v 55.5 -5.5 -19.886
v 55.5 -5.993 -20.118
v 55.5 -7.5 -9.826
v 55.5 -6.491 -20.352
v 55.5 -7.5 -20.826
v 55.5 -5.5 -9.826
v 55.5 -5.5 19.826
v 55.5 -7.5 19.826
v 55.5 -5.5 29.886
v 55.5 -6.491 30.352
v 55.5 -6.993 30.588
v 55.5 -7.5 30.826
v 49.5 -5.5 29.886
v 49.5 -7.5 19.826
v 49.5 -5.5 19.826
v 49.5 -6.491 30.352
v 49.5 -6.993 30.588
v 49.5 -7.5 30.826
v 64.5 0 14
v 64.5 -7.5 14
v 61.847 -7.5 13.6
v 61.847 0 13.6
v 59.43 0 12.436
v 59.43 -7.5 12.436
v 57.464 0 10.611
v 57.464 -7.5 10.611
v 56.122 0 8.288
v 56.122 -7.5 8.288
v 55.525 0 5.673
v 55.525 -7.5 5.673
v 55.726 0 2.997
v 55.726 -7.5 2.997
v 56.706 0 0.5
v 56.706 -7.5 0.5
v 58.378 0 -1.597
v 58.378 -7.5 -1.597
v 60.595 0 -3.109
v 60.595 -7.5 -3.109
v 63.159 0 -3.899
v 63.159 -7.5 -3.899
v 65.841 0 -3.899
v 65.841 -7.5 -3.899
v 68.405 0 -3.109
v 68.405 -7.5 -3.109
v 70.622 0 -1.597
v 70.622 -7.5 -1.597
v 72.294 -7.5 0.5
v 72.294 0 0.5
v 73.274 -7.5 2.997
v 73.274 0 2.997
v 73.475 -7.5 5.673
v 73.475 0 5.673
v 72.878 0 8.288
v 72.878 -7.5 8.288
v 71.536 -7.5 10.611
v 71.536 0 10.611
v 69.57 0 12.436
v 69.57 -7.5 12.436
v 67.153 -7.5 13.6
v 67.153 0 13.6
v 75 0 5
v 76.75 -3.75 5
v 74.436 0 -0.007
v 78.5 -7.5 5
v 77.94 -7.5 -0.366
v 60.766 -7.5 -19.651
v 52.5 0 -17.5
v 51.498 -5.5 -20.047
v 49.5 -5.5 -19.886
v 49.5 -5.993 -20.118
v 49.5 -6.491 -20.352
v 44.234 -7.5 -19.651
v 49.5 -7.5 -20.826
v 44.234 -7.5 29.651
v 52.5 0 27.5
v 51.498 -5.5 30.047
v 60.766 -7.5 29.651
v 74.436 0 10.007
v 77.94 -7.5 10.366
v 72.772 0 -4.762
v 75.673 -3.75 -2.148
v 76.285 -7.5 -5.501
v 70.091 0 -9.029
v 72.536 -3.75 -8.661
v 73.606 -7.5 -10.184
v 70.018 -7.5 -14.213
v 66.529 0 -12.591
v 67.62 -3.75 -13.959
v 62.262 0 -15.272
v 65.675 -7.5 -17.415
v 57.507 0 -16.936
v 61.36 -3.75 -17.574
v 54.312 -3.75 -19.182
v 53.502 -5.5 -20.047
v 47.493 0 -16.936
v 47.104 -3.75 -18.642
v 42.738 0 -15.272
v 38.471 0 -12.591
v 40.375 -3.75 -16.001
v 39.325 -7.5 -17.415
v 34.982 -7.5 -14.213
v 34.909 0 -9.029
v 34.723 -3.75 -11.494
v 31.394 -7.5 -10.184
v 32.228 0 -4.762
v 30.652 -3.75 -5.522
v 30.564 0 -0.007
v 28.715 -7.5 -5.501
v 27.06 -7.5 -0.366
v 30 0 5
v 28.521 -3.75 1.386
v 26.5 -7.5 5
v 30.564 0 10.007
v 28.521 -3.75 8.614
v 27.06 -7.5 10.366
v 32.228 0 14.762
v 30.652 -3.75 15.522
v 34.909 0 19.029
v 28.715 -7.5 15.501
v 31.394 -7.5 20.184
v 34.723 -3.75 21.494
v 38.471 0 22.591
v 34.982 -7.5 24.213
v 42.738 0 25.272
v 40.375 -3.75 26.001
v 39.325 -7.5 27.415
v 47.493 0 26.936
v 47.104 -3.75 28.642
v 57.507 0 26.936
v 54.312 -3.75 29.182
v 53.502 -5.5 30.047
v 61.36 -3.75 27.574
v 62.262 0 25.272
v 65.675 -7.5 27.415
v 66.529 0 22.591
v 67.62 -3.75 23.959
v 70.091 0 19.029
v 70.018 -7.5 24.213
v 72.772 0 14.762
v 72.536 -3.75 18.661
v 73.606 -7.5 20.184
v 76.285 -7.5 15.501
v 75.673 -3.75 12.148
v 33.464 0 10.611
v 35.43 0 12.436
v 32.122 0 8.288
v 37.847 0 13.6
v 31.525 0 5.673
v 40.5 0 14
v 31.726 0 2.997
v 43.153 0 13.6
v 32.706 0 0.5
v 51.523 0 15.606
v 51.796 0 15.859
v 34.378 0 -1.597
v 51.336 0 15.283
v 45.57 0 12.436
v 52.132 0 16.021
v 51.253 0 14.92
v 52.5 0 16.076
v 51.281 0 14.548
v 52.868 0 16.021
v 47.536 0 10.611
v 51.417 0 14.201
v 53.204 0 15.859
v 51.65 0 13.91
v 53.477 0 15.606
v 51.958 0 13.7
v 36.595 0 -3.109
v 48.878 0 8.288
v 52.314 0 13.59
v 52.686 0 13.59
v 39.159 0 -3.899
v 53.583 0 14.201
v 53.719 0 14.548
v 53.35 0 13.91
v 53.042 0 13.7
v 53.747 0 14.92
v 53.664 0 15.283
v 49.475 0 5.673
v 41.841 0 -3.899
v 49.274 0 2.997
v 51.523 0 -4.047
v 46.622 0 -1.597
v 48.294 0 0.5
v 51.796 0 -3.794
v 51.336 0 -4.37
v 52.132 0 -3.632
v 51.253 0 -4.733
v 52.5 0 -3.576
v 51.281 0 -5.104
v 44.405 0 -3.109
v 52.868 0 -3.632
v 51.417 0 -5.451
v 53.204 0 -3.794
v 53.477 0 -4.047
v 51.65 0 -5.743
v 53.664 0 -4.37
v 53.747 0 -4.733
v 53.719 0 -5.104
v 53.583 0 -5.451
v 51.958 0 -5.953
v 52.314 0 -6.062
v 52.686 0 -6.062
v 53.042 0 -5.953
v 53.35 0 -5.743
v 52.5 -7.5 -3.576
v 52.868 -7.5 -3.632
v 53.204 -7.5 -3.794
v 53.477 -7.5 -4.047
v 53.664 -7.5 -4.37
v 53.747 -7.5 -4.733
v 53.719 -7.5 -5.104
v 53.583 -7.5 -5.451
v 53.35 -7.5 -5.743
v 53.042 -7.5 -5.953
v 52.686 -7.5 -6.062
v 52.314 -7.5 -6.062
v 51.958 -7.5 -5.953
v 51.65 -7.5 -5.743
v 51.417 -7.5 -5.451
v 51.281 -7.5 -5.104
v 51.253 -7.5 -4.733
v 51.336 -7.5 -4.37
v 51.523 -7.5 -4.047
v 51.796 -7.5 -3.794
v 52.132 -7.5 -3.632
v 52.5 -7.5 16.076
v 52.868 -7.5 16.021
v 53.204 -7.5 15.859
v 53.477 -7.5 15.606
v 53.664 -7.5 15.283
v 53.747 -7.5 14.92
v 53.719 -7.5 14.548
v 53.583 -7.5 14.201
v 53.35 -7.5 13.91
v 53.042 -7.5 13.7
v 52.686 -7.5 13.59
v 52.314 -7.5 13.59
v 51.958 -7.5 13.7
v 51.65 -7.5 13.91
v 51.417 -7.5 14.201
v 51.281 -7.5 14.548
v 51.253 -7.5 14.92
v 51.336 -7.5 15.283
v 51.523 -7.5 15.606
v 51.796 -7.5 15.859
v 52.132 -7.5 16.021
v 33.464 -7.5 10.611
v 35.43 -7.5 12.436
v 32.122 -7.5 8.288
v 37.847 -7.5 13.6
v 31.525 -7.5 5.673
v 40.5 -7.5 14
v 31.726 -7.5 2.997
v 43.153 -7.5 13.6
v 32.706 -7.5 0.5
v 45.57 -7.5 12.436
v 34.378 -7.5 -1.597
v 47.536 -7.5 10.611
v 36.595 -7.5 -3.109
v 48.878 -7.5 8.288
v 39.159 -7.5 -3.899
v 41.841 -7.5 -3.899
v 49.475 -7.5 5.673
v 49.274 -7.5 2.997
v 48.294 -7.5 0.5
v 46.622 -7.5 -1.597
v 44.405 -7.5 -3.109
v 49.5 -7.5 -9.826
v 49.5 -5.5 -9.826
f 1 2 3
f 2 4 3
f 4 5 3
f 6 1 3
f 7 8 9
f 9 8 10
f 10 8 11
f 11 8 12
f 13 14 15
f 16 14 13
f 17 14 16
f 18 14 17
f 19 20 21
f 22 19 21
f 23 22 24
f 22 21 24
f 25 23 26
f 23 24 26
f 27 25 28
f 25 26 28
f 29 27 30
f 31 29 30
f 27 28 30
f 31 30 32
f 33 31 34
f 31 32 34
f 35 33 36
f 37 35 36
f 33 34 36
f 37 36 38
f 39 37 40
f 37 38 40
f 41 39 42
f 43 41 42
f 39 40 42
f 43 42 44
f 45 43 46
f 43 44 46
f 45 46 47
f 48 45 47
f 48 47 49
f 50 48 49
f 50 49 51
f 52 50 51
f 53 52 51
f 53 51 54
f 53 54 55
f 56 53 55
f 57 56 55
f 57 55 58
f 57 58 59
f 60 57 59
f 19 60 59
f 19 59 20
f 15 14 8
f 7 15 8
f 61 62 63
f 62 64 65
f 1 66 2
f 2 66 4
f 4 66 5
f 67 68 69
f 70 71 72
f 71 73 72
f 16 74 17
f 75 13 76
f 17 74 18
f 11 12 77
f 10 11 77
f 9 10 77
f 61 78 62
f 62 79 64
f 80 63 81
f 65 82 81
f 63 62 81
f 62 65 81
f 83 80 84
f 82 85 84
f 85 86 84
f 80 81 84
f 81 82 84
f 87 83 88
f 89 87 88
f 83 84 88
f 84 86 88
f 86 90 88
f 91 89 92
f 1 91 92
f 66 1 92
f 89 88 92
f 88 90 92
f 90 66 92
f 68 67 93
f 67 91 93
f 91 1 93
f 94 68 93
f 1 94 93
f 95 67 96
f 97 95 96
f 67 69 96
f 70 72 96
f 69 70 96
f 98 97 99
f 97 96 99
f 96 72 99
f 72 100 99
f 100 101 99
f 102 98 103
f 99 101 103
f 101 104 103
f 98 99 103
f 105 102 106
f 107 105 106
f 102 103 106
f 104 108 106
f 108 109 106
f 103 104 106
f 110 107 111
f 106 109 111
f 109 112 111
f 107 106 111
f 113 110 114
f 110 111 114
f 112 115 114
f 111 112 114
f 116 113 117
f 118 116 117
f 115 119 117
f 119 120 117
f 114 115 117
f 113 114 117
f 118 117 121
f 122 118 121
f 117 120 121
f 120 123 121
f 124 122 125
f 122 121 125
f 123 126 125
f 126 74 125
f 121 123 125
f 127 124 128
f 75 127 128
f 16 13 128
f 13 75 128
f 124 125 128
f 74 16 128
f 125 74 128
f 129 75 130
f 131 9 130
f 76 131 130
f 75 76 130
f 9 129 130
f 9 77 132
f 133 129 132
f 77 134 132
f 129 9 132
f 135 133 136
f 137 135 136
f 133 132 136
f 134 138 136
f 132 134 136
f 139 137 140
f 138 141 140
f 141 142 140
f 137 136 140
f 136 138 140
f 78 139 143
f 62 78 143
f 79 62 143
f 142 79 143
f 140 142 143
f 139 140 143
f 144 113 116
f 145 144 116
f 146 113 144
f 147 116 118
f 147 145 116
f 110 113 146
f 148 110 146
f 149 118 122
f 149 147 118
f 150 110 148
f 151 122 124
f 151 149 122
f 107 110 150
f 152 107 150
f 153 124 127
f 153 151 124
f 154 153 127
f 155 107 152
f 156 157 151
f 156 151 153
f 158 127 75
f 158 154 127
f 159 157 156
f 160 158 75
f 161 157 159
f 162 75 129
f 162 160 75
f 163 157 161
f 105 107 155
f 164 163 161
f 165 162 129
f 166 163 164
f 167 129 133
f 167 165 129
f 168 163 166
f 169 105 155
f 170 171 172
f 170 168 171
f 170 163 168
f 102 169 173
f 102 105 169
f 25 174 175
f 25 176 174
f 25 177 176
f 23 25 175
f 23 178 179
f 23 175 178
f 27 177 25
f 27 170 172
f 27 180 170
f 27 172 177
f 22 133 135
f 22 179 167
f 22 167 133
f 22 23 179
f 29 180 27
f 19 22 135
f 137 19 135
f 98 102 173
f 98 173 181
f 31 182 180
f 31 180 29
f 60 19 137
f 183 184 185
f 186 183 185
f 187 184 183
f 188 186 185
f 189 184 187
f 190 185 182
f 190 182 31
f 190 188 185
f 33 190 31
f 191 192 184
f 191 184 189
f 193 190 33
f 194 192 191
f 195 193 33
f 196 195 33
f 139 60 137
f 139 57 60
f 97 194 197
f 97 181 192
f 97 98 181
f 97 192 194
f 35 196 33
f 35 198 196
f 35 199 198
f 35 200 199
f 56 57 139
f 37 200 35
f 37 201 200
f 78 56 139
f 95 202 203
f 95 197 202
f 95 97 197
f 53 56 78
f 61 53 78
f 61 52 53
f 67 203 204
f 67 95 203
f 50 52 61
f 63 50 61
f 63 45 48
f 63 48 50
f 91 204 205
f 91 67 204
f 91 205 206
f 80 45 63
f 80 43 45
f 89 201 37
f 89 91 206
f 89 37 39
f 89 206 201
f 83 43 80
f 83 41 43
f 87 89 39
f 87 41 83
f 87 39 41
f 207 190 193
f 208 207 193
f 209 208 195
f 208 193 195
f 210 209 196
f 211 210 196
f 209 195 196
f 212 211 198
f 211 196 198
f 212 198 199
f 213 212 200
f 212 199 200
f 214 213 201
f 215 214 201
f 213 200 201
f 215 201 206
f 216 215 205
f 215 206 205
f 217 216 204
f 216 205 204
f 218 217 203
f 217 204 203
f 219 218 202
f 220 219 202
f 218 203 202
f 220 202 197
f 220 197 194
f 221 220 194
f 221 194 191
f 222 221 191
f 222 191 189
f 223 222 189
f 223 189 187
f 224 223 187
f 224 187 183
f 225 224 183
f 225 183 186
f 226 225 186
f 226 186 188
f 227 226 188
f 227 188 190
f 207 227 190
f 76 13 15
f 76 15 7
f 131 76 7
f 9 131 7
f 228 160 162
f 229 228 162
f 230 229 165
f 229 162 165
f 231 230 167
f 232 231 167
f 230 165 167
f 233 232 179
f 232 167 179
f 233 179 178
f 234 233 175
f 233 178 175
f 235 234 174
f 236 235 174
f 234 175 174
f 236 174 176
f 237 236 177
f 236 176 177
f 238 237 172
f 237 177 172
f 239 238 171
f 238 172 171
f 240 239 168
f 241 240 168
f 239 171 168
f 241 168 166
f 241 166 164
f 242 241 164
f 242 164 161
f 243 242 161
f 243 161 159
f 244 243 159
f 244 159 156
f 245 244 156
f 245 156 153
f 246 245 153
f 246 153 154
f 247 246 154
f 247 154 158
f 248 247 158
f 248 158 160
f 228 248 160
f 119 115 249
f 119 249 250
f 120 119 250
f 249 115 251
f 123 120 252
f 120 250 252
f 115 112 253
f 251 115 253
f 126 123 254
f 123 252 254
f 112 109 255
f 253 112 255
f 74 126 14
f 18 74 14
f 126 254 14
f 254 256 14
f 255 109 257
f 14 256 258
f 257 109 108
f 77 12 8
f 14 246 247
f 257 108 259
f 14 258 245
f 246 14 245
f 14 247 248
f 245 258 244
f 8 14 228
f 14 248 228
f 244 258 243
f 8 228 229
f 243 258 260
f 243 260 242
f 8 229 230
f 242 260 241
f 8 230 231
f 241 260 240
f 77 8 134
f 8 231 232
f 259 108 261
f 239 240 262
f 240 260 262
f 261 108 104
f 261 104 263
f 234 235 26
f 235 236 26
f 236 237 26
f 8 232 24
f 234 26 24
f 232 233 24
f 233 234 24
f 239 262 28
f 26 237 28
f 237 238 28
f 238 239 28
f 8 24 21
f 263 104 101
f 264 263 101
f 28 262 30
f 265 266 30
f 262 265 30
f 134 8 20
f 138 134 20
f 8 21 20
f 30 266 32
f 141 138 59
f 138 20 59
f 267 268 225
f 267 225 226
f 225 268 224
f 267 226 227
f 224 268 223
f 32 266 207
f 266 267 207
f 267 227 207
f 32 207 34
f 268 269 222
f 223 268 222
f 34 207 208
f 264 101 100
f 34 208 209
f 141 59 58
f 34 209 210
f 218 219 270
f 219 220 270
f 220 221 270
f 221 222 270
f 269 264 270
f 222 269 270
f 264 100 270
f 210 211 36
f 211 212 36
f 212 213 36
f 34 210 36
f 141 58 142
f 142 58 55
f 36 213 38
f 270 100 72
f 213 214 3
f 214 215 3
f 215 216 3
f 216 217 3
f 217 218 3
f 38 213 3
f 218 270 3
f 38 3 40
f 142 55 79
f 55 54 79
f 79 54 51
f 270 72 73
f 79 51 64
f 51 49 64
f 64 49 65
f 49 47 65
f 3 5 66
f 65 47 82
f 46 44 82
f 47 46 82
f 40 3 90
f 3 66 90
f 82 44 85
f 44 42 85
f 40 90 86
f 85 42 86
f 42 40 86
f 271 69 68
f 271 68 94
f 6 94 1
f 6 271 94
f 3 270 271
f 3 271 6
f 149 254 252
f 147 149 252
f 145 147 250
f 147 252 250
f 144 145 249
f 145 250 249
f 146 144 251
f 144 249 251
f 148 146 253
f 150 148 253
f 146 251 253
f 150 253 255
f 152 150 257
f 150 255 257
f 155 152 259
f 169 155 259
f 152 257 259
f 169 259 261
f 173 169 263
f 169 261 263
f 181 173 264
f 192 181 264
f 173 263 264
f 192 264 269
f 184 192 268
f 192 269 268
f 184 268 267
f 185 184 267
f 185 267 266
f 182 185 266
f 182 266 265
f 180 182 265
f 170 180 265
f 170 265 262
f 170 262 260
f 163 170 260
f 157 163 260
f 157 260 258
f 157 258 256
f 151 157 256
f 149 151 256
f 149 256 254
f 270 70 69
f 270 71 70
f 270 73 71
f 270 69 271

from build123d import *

# Parameters (mm, degrees)
SKETCH1_W                = 207
SKETCH1_H                = 106
BOSS_EXTRUDE1_DEPTH      = 35.5
SKETCH2_W                = 201
SKETCH2_H                = 100
CUT_EXTRUDE1_DEPTH       = 32
SKETCH3_W                = 204
SKETCH3_H                = 103
SKETCH3_W_2              = 201
SKETCH3_H_2              = 100
CUT_EXTRUDE2_DEPTH       = 3
M18_CLEARANCE_HOLE2_D    = 18
FILLET1_R                = 2
FILLET2_R                = 2
SKETCH6_W                = 10
SKETCH6_H                = 10
BOSS_EXTRUDE2_DEPTH      = 29
SKETCH7_W                = 10
SKETCH7_H                = 10
BOSS_EXTRUDE3_DEPTH      = 29
SKETCH8_W                = 10
SKETCH8_H                = 10
BOSS_EXTRUDE4_DEPTH      = 29
SKETCH9_W                = 10
SKETCH9_H                = 10
BOSS_EXTRUDE5_DEPTH      = 29
M3_CLEARANCE_HOLE1_D     = 3.4
M3_CLEARANCE_HOLE1_DEPTH = 26
M3_CLEARANCE_HOLE1_TIP   = 1.021463052
SKETCH12_R               = 3
CUT_EXTRUDE4_DEPTH       = 6
SKETCH13_R               = 3
CUT_EXTRUDE5_DEPTH       = 6
SKETCH14_R               = 3
CUT_EXTRUDE6_DEPTH       = 6
SKETCH15_R               = 3
CUT_EXTRUDE8_DEPTH       = 6
SKETCH17_R               = 22.5
SKETCH16_R               = 26
SKETCH18_R               = 9
CUT_EXTRUDE9_DEPTH       = 124.976812348
SKETCH19_R               = 9
CUT_EXTRUDE10_DEPTH      = 124.976812348
SKETCH20_W               = 6
SKETCH20_H               = 11
CUT_EXTRUDE13_DEPTH      = 2
SKETCH21_W               = 6
SKETCH21_H               = 11
CUT_EXTRUDE14_DEPTH      = 2
SKETCH22_W               = 218.453693545
SKETCH22_H               = 118.706912719
SKETCH22_R               = 34.681443639
CUT_EXTRUDE15_DEPTH      = 122.579192299
SKETCH23_R               = 34.681443639
CUT_EXTRUDE16_DEPTH      = 9
CUT_EXTRUDE16_DEPTH_BACK = 3.5
M3X0_5_TAPPED_HOLE1_D    = 2.5


with BuildPart() as part:
    # Sketch1 → Boss-Extrude1 (new body)
    with BuildSketch(Plane(origin=(0, 0, 0), x_dir=(1, 0, 0), z_dir=(0, 1, 0))):
        Rectangle(SKETCH1_W, SKETCH1_H)
    extrude(amount=BOSS_EXTRUDE1_DEPTH)

    # Sketch2 → Cut-Extrude1 (cut)
    with BuildSketch(Plane(origin=(0, 35.5, 0), x_dir=(1, 0, 0), z_dir=(0, 1, 0))):
        Rectangle(SKETCH2_W, SKETCH2_H)
    extrude(amount=-CUT_EXTRUDE1_DEPTH, mode=Mode.SUBTRACT)

    # Sketch3 → Cut-Extrude2 (cut)
    with BuildSketch(Plane(origin=(0, 35.5, 0), x_dir=(1, 0, 0), z_dir=(0, 1, 0))):
        Rectangle(SKETCH3_W, SKETCH3_H)
        Rectangle(SKETCH3_W_2, SKETCH3_H_2, mode=Mode.SUBTRACT)
    extrude(amount=-CUT_EXTRUDE2_DEPTH, mode=Mode.SUBTRACT)

    # M18 Clearance Hole2 (through all)
    with Locations(Plane(origin=(64.5, 3.5, 5), x_dir=(0, 0, 1), z_dir=(0, 1, 0))):
        with Locations((0, 0), (0, -24)):
            Hole(M18_CLEARANCE_HOLE2_D / 2)

    # Fillet1
    fillet1_edges = [part.edges().sort_by_distance(p)[0] for p in [
        (100.5, 18, -50),
        (100.5, 18, 50),
        (-100.5, 18, 50),
        (-100.5, 18, -50),
        (0, 0, 53),
        (-103.5, 0, 0),
        (0, 0, -53),
        (103.5, 0, 0),
        (103.5, 17.75, 53),
        (-103.5, 17.75, 53),
        (-103.5, 17.75, -53),
        (103.5, 17.75, -53),
    ]]
    fillet(fillet1_edges, radius=FILLET1_R)

    # Fillet2
    fillet2_edges = [part.edges().sort_by_distance(p)[0] for p in [
        (-102, 34, 51.5),
        (-102, 34, -51.5),
        (102, 34, -51.5),
        (102, 34, 51.5),
    ]]
    fillet(fillet2_edges, radius=FILLET2_R)

    # Sketch6 → Boss-Extrude2 (add)
    with BuildSketch(Plane(origin=(0, 3.5, 0), x_dir=(1, 0, 0), z_dir=(0, 1, 0))):
        with Locations((-43.5, 45)):
            Rectangle(SKETCH6_W, SKETCH6_H)
    extrude(amount=BOSS_EXTRUDE2_DEPTH)

    # Sketch7 → Boss-Extrude3 (add)
    with BuildSketch(Plane(origin=(0, 3.5, 0), x_dir=(1, 0, 0), z_dir=(0, 1, 0))):
        with Locations((-43.5, -45)):
            Rectangle(SKETCH7_W, SKETCH7_H)
    extrude(amount=BOSS_EXTRUDE3_DEPTH)

    # Sketch8 → Boss-Extrude4 (add)
    with BuildSketch(Plane(origin=(0, 3.5, 0), x_dir=(1, 0, 0), z_dir=(0, 1, 0))):
        with Locations((95.5, 20)):
            Rectangle(SKETCH8_W, SKETCH8_H)
    extrude(amount=BOSS_EXTRUDE4_DEPTH)

    # Sketch9 → Boss-Extrude5 (add)
    with BuildSketch(Plane(origin=(0, 3.5, 0), x_dir=(1, 0, 0), z_dir=(0, 1, 0))):
        with Locations((95.5, -20)):
            Rectangle(SKETCH9_W, SKETCH9_H)
    extrude(amount=BOSS_EXTRUDE5_DEPTH)

    # M3 Clearance Hole1
    with Locations(Plane(origin=(-43.5, 32.5, -45), x_dir=(0, 0, 1), z_dir=(0, 1, 0))):
        with Locations((0, 0), (90, 0), (65, 139), (25, 139)):
            Hole(M3_CLEARANCE_HOLE1_D / 2, depth=M3_CLEARANCE_HOLE1_DEPTH)
            with Locations((0, 0, -(M3_CLEARANCE_HOLE1_DEPTH + M3_CLEARANCE_HOLE1_TIP / 2))):  # 118° drill point
                Cone(0, M3_CLEARANCE_HOLE1_D / 2, M3_CLEARANCE_HOLE1_TIP, mode=Mode.SUBTRACT)

    # Sketch12 → Cut-Extrude4 (cut)
    with BuildSketch(Plane.XZ):
        with Locations(Location((-43.5, 45, 0), (0, 0, 270))):
            Circle(SKETCH12_R)
    extrude(amount=-CUT_EXTRUDE4_DEPTH, mode=Mode.SUBTRACT)

    # Sketch13 → Cut-Extrude5 (cut)
    with BuildSketch(Plane.XZ):
        with Locations(Location((-43.5, -45, 0), (0, 0, 270))):
            Circle(SKETCH13_R)
    extrude(amount=-CUT_EXTRUDE5_DEPTH, mode=Mode.SUBTRACT)

    # Sketch14 → Cut-Extrude6 (cut)
    with BuildSketch(Plane.XZ):
        with Locations(Location((95.5, 20, 0), (0, 0, 270))):
            Circle(SKETCH14_R)
    extrude(amount=-CUT_EXTRUDE6_DEPTH, mode=Mode.SUBTRACT)

    # Sketch15 → Cut-Extrude8 (cut)
    with BuildSketch(Plane.XZ):
        with Locations(Location((95.5, -20, 0), (0, 0, 270))):
            Circle(SKETCH15_R)
    extrude(amount=-CUT_EXTRUDE8_DEPTH, mode=Mode.SUBTRACT)

    # Sketch17 → Loft2 section 0
    with BuildSketch(Plane(origin=(0, 0, 0), x_dir=(1, 0, 0), z_dir=(0, 1, 0))):
        with Locations((52.5, -5)):
            Circle(SKETCH17_R)
    # Sketch16 → Loft2 section 1
    with BuildSketch(Plane(origin=(0, -7.5, 0), x_dir=(1, 0, 0), z_dir=(0, 1, 0))):
        with Locations((52.5, -5)):
            Circle(SKETCH16_R)
    loft()

    # Sketch18 → Cut-Extrude9 (cut, through all)
    with BuildSketch(Plane.XZ.offset(7.5)):
        with Locations(Location((40.5, 5, 0), (0, 0, 90))):
            Circle(SKETCH18_R)
    extrude(amount=-CUT_EXTRUDE9_DEPTH, mode=Mode.SUBTRACT)

    # Sketch19 → Cut-Extrude10 (cut, through all)
    with BuildSketch(Plane.XZ.offset(7.5)):
        with Locations(Location((64.5, 5, 0), (0, 0, 90))):
            Circle(SKETCH19_R)
    extrude(amount=-CUT_EXTRUDE10_DEPTH, mode=Mode.SUBTRACT)

    # Sketch20 → Cut-Extrude13 (cut)
    with BuildSketch(Plane.XZ.offset(7.5)):
        with Locations((52.5, 25.32634314)):
            Rectangle(SKETCH20_W, SKETCH20_H)
    extrude(amount=-CUT_EXTRUDE13_DEPTH, mode=Mode.SUBTRACT)


with BuildPart() as cut_extrude13_kept_piece:
    # of the separate pieces the step leaves, the one the design keeps (cut_extrude13_pieces_kept)
    add(part.part.solids().sort_by_distance((-100, 35.5, -51.5))[0])

    # Sketch21 → Cut-Extrude14 (cut)
    with BuildSketch(Plane.XZ.offset(7.5)):
        with Locations((52.5, -15.32634314)):
            Rectangle(SKETCH21_W, SKETCH21_H)
    extrude(amount=-CUT_EXTRUDE14_DEPTH, mode=Mode.SUBTRACT)


with BuildPart() as cut_extrude14_kept_piece:
    # of the separate pieces the step leaves, the one the design keeps (cut_extrude14_pieces_kept)
    add(cut_extrude13_kept_piece.part.solids().sort_by_distance((-100, 35.5, -51.5))[0])

    # Sketch22 → Cut-Extrude15 (cut, through all)
    with BuildSketch(Plane.XZ):
        with Locations((2.060883901, -1.23653034)):
            Rectangle(SKETCH22_W, SKETCH22_H)
        with Locations(Location((52.5, 5, 0), (0, 0, 270))):
            Circle(SKETCH22_R, mode=Mode.SUBTRACT)
    extrude(amount=-CUT_EXTRUDE15_DEPTH, mode=Mode.SUBTRACT)

    # Sketch23 → Cut-Extrude16 (cut, two sides)
    with BuildSketch(Plane(origin=(0, 3.5, 0), x_dir=(1, 0, 0), z_dir=(0, 1, 0))) as cut_extrude16_sk:
        with Locations((52.5, -5)):
            Circle(SKETCH23_R)
    extrude(amount=CUT_EXTRUDE16_DEPTH, mode=Mode.SUBTRACT)
    extrude(cut_extrude16_sk.sketch, amount=-CUT_EXTRUDE16_DEPTH_BACK, mode=Mode.SUBTRACT)

    # M3x0.5 Tapped Hole1 (through all)
    with Locations(Plane(origin=(52.5, -7.5, 14.82634314), x_dir=(0, 0, -1), z_dir=(0, -1, 0))):
        with Locations((0, 0), (19.65268628, 0)):
            Hole(M3X0_5_TAPPED_HOLE1_D / 2)


solid = cut_extrude14_kept_piece.part
